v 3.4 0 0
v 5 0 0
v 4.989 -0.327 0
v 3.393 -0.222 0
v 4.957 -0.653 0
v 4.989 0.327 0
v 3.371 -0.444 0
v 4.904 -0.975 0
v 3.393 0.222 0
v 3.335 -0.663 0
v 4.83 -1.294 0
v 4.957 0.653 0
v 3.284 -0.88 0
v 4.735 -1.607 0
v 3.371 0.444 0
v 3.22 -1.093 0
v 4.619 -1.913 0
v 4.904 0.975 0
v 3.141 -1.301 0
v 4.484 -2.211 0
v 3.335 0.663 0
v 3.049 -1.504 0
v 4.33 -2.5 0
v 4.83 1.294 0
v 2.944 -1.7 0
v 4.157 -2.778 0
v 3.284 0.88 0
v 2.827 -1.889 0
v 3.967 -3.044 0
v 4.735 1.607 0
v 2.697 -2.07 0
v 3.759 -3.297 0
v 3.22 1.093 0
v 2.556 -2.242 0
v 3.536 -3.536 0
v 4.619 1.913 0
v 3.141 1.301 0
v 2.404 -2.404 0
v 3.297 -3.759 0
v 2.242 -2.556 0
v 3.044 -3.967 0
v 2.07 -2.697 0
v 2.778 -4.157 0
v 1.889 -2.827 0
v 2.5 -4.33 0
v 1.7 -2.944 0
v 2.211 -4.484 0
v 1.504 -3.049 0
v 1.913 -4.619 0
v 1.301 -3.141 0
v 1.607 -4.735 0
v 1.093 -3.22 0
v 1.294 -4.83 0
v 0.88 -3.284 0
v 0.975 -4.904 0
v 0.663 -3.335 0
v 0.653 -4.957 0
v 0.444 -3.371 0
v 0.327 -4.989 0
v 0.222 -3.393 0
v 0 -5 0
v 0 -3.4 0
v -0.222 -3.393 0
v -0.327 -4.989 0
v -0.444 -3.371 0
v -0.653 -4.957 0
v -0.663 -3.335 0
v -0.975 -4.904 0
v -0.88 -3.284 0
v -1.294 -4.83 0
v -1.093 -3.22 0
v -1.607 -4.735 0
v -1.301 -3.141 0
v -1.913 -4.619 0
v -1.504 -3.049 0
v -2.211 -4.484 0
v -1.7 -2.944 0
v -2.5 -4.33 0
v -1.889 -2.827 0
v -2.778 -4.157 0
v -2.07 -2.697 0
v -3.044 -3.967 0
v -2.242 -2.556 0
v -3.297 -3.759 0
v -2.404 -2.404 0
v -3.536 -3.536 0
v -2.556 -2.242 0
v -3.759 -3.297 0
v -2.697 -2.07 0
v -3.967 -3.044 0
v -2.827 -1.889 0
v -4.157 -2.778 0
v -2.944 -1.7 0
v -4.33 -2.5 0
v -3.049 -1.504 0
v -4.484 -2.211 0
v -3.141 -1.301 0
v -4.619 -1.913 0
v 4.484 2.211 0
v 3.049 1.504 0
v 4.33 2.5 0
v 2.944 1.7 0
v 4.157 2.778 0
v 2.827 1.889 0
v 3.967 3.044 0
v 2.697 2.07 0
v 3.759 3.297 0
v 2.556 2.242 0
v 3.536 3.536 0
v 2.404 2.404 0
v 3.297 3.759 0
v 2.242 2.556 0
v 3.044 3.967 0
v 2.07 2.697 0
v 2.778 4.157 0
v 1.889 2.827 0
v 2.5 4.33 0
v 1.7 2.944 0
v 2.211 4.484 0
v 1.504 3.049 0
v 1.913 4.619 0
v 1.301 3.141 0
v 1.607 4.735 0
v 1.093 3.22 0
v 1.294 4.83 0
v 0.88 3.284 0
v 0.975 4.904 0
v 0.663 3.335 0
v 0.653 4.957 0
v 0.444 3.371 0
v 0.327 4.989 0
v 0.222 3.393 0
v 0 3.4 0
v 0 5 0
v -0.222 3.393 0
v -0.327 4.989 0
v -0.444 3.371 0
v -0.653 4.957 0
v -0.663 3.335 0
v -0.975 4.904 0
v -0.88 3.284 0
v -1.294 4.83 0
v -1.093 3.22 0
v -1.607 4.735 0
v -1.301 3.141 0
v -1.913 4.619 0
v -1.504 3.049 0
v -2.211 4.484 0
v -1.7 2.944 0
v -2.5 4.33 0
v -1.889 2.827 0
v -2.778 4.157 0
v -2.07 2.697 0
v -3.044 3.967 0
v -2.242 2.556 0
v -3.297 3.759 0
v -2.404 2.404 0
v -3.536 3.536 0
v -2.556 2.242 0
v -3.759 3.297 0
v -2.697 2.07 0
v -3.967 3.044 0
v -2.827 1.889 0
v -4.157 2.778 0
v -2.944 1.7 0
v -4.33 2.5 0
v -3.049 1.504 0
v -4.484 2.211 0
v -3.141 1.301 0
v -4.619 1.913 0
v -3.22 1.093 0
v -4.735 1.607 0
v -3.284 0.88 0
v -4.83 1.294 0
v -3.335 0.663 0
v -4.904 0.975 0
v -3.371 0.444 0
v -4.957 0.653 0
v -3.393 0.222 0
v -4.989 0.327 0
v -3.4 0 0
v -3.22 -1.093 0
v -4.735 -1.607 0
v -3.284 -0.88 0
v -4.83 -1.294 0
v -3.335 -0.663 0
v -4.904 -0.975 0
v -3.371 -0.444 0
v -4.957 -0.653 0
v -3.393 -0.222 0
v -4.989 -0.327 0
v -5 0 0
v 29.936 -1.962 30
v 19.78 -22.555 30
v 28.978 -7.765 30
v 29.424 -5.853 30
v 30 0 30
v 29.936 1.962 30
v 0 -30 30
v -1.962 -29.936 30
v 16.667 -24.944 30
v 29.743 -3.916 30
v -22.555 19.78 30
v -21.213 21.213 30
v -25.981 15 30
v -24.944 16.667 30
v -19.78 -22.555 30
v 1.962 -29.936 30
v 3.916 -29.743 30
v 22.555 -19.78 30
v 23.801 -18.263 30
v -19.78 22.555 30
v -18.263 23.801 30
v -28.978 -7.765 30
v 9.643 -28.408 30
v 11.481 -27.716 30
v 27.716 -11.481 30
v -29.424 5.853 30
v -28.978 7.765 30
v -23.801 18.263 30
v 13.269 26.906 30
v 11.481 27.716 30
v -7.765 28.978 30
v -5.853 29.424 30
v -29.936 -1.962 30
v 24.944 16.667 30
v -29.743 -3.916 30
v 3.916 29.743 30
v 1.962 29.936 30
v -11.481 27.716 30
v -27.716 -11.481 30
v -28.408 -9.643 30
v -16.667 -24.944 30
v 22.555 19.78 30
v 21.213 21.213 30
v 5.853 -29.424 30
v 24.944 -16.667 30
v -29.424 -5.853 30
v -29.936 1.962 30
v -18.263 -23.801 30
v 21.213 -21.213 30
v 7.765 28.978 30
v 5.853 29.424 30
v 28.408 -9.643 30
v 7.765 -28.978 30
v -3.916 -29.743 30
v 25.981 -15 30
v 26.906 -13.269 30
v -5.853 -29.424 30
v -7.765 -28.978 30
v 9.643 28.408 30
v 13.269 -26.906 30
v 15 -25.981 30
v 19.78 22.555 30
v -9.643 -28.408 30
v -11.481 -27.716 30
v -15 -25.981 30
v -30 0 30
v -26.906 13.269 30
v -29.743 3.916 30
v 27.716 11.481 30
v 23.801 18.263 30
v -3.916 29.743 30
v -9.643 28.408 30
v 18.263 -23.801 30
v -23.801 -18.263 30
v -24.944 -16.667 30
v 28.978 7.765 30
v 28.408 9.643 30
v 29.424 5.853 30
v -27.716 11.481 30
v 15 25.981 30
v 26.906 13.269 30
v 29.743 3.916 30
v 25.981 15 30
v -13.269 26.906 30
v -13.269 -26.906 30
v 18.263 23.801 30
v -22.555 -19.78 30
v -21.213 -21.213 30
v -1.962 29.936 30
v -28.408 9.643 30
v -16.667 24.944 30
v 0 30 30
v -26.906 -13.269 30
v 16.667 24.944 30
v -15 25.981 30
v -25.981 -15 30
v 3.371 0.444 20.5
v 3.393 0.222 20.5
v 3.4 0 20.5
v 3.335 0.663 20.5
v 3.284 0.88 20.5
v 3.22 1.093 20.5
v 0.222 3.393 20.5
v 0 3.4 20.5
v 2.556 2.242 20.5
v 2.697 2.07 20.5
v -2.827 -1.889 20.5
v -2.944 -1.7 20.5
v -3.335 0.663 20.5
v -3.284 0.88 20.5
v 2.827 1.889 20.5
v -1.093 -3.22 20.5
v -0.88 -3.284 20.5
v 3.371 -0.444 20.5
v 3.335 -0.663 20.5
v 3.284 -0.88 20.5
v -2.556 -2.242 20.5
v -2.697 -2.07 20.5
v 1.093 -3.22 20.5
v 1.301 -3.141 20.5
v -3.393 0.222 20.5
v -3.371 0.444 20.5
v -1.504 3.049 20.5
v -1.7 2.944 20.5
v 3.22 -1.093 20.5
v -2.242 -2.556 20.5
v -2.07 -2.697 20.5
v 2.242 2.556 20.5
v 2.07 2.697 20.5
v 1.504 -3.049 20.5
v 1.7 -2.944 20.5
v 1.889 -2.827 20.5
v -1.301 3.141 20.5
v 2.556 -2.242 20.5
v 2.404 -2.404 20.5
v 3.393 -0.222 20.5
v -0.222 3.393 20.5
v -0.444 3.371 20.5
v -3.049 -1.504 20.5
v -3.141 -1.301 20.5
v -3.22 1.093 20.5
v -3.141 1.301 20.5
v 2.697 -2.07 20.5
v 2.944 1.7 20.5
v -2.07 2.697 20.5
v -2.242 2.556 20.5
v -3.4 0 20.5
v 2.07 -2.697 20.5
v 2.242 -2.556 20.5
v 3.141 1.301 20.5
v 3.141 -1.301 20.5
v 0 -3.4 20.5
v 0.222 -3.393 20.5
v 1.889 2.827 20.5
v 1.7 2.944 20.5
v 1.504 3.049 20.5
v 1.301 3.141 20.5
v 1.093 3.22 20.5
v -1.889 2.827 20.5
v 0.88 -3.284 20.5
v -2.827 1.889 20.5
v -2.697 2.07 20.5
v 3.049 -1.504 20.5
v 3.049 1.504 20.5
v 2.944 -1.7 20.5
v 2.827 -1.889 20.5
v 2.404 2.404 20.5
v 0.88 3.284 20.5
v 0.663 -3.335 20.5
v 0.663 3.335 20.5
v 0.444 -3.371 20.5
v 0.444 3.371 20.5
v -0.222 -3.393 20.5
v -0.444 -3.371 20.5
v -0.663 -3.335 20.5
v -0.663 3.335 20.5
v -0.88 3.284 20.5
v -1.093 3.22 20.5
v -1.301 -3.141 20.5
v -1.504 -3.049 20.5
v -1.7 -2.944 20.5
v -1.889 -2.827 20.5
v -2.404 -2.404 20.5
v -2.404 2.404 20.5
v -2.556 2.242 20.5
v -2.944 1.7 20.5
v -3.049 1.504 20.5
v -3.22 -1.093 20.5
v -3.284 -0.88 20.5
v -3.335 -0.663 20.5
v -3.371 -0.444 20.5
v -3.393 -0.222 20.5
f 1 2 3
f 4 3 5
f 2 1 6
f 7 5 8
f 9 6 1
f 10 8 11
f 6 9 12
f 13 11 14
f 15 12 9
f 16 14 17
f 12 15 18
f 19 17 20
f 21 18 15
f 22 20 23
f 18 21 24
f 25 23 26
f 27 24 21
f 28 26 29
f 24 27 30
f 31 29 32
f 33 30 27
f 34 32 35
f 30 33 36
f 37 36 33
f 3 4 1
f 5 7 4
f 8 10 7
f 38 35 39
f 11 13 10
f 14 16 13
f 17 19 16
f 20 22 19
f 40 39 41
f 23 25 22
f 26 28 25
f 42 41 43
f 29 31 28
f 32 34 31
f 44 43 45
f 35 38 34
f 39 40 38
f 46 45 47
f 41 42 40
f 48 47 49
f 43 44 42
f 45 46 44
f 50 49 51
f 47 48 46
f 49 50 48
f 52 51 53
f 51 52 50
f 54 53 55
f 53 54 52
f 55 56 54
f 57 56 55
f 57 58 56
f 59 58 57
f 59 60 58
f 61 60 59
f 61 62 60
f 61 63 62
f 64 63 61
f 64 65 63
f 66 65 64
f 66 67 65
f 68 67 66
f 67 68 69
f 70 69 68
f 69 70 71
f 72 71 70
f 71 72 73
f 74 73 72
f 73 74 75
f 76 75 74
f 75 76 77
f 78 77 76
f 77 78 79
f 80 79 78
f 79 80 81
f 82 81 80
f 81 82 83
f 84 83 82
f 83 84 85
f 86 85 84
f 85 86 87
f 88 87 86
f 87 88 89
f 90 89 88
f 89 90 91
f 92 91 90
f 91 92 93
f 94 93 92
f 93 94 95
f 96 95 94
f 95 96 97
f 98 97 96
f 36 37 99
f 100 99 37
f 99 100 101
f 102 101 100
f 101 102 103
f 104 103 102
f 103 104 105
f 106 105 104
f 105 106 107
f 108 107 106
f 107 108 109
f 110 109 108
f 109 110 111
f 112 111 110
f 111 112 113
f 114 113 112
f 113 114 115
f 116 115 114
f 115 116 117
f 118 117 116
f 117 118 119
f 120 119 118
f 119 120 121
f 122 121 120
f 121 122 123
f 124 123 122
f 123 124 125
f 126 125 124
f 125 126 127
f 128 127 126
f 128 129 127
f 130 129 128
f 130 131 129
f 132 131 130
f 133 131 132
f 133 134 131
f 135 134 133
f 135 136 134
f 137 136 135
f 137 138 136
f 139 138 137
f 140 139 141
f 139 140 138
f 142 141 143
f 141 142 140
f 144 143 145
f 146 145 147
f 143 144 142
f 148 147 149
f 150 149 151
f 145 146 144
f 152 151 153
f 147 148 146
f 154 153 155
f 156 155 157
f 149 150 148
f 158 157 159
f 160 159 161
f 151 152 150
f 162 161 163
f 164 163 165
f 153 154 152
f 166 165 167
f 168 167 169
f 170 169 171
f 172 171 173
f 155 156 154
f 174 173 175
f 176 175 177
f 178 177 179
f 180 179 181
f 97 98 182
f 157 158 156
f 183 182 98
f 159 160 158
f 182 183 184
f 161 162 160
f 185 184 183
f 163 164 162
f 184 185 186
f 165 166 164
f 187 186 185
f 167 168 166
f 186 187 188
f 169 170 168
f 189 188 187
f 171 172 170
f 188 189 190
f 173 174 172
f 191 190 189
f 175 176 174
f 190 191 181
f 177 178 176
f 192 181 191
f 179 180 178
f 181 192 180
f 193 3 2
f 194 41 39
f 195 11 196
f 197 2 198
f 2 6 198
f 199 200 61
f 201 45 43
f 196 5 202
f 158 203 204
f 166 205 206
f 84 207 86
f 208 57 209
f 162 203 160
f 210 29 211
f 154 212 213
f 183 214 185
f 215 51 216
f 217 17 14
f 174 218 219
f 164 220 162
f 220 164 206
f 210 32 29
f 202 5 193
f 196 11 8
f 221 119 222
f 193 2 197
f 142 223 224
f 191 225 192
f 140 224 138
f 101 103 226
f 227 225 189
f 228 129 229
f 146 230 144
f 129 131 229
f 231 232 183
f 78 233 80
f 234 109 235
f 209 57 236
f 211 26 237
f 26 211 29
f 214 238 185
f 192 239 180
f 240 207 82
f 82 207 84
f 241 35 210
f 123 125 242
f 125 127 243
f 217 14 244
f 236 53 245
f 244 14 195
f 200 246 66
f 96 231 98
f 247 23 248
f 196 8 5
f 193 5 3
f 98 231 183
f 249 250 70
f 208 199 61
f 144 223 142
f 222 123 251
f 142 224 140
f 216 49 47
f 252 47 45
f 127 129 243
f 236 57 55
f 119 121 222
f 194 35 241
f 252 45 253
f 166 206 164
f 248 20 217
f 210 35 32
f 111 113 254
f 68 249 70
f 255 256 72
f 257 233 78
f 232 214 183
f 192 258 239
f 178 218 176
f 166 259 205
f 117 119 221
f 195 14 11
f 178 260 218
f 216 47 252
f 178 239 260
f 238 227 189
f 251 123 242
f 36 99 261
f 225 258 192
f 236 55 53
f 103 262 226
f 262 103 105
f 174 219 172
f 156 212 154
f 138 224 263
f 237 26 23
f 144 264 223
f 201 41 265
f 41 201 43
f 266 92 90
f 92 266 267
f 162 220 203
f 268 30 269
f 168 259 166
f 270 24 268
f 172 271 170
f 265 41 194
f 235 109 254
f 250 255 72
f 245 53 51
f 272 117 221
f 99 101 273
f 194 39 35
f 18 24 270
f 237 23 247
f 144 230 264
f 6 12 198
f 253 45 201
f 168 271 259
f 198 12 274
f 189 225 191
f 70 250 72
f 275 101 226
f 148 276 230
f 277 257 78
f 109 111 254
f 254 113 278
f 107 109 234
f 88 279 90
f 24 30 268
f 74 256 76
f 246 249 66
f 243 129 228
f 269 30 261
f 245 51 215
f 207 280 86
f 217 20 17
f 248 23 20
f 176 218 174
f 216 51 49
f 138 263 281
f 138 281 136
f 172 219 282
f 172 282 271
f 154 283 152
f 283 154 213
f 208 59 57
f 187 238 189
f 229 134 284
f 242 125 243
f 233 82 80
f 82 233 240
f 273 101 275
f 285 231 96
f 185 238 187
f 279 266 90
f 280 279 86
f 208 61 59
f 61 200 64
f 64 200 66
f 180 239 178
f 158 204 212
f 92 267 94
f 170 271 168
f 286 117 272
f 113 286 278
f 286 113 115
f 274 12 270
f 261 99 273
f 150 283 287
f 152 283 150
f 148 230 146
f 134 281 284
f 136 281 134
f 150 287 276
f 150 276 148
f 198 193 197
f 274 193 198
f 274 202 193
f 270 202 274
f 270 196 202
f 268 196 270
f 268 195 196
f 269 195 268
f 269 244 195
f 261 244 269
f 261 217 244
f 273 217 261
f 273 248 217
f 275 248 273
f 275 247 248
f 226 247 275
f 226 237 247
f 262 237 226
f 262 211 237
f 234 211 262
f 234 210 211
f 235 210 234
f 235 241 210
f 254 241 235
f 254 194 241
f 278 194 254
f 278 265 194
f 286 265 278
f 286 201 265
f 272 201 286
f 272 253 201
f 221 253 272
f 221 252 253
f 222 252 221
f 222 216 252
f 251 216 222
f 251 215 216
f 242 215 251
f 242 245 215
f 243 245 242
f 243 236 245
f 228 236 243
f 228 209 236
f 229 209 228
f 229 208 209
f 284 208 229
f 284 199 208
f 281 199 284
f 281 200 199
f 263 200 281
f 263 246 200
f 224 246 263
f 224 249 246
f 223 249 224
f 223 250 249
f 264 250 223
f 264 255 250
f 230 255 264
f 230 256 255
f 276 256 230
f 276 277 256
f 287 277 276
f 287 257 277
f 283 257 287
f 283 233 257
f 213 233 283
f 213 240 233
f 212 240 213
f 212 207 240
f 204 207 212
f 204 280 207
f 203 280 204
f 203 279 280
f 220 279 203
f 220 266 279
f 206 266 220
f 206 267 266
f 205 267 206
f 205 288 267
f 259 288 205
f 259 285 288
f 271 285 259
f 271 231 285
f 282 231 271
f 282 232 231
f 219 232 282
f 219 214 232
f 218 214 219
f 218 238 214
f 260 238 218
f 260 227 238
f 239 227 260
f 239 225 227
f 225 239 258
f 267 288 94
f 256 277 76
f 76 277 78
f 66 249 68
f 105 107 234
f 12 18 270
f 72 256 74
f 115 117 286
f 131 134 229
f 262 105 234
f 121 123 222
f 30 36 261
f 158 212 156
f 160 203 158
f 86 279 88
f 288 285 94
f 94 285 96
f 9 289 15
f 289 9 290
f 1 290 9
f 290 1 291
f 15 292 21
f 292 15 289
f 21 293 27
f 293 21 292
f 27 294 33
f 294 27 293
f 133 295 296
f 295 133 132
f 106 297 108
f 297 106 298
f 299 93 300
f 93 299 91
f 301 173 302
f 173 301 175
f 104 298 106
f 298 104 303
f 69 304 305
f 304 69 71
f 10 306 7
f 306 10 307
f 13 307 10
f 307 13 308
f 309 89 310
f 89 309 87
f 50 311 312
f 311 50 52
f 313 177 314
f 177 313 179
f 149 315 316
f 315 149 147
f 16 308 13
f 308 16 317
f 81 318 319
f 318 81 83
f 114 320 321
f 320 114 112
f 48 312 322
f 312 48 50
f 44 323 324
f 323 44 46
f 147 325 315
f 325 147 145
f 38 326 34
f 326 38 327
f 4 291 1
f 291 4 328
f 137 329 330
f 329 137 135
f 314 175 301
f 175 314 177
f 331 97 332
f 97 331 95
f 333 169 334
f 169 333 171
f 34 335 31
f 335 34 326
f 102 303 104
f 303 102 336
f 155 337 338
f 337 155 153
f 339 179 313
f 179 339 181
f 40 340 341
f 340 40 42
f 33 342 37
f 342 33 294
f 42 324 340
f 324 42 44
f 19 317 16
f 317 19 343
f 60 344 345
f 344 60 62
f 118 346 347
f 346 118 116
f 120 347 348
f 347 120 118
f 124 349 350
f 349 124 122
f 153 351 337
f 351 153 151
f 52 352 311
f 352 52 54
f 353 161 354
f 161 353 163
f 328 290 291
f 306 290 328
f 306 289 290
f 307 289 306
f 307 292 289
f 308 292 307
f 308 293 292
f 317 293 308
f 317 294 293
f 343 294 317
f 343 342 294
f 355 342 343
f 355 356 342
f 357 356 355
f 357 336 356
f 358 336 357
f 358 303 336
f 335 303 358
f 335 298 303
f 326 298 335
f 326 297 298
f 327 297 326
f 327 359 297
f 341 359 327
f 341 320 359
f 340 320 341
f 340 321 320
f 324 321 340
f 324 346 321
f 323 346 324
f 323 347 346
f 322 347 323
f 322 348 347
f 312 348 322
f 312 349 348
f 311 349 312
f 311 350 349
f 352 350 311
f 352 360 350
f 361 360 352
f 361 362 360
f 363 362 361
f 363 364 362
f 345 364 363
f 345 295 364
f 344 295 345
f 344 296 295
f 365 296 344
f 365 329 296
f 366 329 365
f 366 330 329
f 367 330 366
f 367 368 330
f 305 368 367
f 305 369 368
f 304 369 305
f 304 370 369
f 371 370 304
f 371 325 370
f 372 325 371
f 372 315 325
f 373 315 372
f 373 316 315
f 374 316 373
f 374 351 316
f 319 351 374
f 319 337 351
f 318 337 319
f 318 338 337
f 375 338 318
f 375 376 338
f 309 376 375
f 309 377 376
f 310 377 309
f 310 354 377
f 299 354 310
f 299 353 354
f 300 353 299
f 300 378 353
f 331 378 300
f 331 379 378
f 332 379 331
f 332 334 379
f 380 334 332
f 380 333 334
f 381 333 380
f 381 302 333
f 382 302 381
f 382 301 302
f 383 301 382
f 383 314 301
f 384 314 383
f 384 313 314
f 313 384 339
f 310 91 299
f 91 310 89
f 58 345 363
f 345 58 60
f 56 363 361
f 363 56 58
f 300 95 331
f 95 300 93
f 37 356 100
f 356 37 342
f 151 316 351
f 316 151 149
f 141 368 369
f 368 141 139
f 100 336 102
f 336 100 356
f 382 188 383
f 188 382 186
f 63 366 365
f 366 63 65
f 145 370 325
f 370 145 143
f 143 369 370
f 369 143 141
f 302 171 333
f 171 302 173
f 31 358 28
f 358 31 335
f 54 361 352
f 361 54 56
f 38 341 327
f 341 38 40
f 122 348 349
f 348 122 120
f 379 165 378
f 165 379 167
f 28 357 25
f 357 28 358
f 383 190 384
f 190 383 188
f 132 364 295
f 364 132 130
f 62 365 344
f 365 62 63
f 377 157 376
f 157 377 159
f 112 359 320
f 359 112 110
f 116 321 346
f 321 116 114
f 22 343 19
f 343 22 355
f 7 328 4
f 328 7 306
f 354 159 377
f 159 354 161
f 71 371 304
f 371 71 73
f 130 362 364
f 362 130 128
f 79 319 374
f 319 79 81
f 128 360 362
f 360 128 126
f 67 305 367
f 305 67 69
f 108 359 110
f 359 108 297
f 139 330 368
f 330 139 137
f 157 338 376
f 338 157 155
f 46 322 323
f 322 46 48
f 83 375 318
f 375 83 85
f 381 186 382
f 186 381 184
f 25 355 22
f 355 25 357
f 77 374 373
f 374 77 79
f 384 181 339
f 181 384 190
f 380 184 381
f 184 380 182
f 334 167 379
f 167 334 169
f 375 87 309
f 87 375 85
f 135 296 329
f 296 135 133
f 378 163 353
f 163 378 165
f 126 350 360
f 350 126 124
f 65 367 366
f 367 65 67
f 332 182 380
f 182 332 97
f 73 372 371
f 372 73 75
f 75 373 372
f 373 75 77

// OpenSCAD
// Small lab funnel - printed upright, open at top and bottom
// Units: mm

// ---- Parameters ----
spout_od      = 10;    // spout outer diameter
spout_id      = spout_od - 2 * 1.6;  // spout bore (6.8)
spout_h       = 20;    // spout height (z = 0 to 20)
cone_top_d    = 10;    // cone diameter where it meets the spout (z = 20)
cone_rim_d    = 60;    // cone rim diameter (z = 50)
cone_h        = 30;    // cone height (z = 20 to 50)
wall          = 1.6;   // wall thickness everywhere
eps           = 0.5;   // cutter overshoot past faces

$fn = 96;

// ---- Model ----
difference() {
    union() {
        // Spout (tube)
        cylinder(d = spout_od, h = spout_h);
        // Cone
        cylinder(d1 = cone_top_d, d2 = cone_rim_d, h = cone_h);
    }
    // Bore through the spout
    translate([0, 0, -eps])
        cylinder(d = spout_id, h = spout_h + 2 * eps);
}
